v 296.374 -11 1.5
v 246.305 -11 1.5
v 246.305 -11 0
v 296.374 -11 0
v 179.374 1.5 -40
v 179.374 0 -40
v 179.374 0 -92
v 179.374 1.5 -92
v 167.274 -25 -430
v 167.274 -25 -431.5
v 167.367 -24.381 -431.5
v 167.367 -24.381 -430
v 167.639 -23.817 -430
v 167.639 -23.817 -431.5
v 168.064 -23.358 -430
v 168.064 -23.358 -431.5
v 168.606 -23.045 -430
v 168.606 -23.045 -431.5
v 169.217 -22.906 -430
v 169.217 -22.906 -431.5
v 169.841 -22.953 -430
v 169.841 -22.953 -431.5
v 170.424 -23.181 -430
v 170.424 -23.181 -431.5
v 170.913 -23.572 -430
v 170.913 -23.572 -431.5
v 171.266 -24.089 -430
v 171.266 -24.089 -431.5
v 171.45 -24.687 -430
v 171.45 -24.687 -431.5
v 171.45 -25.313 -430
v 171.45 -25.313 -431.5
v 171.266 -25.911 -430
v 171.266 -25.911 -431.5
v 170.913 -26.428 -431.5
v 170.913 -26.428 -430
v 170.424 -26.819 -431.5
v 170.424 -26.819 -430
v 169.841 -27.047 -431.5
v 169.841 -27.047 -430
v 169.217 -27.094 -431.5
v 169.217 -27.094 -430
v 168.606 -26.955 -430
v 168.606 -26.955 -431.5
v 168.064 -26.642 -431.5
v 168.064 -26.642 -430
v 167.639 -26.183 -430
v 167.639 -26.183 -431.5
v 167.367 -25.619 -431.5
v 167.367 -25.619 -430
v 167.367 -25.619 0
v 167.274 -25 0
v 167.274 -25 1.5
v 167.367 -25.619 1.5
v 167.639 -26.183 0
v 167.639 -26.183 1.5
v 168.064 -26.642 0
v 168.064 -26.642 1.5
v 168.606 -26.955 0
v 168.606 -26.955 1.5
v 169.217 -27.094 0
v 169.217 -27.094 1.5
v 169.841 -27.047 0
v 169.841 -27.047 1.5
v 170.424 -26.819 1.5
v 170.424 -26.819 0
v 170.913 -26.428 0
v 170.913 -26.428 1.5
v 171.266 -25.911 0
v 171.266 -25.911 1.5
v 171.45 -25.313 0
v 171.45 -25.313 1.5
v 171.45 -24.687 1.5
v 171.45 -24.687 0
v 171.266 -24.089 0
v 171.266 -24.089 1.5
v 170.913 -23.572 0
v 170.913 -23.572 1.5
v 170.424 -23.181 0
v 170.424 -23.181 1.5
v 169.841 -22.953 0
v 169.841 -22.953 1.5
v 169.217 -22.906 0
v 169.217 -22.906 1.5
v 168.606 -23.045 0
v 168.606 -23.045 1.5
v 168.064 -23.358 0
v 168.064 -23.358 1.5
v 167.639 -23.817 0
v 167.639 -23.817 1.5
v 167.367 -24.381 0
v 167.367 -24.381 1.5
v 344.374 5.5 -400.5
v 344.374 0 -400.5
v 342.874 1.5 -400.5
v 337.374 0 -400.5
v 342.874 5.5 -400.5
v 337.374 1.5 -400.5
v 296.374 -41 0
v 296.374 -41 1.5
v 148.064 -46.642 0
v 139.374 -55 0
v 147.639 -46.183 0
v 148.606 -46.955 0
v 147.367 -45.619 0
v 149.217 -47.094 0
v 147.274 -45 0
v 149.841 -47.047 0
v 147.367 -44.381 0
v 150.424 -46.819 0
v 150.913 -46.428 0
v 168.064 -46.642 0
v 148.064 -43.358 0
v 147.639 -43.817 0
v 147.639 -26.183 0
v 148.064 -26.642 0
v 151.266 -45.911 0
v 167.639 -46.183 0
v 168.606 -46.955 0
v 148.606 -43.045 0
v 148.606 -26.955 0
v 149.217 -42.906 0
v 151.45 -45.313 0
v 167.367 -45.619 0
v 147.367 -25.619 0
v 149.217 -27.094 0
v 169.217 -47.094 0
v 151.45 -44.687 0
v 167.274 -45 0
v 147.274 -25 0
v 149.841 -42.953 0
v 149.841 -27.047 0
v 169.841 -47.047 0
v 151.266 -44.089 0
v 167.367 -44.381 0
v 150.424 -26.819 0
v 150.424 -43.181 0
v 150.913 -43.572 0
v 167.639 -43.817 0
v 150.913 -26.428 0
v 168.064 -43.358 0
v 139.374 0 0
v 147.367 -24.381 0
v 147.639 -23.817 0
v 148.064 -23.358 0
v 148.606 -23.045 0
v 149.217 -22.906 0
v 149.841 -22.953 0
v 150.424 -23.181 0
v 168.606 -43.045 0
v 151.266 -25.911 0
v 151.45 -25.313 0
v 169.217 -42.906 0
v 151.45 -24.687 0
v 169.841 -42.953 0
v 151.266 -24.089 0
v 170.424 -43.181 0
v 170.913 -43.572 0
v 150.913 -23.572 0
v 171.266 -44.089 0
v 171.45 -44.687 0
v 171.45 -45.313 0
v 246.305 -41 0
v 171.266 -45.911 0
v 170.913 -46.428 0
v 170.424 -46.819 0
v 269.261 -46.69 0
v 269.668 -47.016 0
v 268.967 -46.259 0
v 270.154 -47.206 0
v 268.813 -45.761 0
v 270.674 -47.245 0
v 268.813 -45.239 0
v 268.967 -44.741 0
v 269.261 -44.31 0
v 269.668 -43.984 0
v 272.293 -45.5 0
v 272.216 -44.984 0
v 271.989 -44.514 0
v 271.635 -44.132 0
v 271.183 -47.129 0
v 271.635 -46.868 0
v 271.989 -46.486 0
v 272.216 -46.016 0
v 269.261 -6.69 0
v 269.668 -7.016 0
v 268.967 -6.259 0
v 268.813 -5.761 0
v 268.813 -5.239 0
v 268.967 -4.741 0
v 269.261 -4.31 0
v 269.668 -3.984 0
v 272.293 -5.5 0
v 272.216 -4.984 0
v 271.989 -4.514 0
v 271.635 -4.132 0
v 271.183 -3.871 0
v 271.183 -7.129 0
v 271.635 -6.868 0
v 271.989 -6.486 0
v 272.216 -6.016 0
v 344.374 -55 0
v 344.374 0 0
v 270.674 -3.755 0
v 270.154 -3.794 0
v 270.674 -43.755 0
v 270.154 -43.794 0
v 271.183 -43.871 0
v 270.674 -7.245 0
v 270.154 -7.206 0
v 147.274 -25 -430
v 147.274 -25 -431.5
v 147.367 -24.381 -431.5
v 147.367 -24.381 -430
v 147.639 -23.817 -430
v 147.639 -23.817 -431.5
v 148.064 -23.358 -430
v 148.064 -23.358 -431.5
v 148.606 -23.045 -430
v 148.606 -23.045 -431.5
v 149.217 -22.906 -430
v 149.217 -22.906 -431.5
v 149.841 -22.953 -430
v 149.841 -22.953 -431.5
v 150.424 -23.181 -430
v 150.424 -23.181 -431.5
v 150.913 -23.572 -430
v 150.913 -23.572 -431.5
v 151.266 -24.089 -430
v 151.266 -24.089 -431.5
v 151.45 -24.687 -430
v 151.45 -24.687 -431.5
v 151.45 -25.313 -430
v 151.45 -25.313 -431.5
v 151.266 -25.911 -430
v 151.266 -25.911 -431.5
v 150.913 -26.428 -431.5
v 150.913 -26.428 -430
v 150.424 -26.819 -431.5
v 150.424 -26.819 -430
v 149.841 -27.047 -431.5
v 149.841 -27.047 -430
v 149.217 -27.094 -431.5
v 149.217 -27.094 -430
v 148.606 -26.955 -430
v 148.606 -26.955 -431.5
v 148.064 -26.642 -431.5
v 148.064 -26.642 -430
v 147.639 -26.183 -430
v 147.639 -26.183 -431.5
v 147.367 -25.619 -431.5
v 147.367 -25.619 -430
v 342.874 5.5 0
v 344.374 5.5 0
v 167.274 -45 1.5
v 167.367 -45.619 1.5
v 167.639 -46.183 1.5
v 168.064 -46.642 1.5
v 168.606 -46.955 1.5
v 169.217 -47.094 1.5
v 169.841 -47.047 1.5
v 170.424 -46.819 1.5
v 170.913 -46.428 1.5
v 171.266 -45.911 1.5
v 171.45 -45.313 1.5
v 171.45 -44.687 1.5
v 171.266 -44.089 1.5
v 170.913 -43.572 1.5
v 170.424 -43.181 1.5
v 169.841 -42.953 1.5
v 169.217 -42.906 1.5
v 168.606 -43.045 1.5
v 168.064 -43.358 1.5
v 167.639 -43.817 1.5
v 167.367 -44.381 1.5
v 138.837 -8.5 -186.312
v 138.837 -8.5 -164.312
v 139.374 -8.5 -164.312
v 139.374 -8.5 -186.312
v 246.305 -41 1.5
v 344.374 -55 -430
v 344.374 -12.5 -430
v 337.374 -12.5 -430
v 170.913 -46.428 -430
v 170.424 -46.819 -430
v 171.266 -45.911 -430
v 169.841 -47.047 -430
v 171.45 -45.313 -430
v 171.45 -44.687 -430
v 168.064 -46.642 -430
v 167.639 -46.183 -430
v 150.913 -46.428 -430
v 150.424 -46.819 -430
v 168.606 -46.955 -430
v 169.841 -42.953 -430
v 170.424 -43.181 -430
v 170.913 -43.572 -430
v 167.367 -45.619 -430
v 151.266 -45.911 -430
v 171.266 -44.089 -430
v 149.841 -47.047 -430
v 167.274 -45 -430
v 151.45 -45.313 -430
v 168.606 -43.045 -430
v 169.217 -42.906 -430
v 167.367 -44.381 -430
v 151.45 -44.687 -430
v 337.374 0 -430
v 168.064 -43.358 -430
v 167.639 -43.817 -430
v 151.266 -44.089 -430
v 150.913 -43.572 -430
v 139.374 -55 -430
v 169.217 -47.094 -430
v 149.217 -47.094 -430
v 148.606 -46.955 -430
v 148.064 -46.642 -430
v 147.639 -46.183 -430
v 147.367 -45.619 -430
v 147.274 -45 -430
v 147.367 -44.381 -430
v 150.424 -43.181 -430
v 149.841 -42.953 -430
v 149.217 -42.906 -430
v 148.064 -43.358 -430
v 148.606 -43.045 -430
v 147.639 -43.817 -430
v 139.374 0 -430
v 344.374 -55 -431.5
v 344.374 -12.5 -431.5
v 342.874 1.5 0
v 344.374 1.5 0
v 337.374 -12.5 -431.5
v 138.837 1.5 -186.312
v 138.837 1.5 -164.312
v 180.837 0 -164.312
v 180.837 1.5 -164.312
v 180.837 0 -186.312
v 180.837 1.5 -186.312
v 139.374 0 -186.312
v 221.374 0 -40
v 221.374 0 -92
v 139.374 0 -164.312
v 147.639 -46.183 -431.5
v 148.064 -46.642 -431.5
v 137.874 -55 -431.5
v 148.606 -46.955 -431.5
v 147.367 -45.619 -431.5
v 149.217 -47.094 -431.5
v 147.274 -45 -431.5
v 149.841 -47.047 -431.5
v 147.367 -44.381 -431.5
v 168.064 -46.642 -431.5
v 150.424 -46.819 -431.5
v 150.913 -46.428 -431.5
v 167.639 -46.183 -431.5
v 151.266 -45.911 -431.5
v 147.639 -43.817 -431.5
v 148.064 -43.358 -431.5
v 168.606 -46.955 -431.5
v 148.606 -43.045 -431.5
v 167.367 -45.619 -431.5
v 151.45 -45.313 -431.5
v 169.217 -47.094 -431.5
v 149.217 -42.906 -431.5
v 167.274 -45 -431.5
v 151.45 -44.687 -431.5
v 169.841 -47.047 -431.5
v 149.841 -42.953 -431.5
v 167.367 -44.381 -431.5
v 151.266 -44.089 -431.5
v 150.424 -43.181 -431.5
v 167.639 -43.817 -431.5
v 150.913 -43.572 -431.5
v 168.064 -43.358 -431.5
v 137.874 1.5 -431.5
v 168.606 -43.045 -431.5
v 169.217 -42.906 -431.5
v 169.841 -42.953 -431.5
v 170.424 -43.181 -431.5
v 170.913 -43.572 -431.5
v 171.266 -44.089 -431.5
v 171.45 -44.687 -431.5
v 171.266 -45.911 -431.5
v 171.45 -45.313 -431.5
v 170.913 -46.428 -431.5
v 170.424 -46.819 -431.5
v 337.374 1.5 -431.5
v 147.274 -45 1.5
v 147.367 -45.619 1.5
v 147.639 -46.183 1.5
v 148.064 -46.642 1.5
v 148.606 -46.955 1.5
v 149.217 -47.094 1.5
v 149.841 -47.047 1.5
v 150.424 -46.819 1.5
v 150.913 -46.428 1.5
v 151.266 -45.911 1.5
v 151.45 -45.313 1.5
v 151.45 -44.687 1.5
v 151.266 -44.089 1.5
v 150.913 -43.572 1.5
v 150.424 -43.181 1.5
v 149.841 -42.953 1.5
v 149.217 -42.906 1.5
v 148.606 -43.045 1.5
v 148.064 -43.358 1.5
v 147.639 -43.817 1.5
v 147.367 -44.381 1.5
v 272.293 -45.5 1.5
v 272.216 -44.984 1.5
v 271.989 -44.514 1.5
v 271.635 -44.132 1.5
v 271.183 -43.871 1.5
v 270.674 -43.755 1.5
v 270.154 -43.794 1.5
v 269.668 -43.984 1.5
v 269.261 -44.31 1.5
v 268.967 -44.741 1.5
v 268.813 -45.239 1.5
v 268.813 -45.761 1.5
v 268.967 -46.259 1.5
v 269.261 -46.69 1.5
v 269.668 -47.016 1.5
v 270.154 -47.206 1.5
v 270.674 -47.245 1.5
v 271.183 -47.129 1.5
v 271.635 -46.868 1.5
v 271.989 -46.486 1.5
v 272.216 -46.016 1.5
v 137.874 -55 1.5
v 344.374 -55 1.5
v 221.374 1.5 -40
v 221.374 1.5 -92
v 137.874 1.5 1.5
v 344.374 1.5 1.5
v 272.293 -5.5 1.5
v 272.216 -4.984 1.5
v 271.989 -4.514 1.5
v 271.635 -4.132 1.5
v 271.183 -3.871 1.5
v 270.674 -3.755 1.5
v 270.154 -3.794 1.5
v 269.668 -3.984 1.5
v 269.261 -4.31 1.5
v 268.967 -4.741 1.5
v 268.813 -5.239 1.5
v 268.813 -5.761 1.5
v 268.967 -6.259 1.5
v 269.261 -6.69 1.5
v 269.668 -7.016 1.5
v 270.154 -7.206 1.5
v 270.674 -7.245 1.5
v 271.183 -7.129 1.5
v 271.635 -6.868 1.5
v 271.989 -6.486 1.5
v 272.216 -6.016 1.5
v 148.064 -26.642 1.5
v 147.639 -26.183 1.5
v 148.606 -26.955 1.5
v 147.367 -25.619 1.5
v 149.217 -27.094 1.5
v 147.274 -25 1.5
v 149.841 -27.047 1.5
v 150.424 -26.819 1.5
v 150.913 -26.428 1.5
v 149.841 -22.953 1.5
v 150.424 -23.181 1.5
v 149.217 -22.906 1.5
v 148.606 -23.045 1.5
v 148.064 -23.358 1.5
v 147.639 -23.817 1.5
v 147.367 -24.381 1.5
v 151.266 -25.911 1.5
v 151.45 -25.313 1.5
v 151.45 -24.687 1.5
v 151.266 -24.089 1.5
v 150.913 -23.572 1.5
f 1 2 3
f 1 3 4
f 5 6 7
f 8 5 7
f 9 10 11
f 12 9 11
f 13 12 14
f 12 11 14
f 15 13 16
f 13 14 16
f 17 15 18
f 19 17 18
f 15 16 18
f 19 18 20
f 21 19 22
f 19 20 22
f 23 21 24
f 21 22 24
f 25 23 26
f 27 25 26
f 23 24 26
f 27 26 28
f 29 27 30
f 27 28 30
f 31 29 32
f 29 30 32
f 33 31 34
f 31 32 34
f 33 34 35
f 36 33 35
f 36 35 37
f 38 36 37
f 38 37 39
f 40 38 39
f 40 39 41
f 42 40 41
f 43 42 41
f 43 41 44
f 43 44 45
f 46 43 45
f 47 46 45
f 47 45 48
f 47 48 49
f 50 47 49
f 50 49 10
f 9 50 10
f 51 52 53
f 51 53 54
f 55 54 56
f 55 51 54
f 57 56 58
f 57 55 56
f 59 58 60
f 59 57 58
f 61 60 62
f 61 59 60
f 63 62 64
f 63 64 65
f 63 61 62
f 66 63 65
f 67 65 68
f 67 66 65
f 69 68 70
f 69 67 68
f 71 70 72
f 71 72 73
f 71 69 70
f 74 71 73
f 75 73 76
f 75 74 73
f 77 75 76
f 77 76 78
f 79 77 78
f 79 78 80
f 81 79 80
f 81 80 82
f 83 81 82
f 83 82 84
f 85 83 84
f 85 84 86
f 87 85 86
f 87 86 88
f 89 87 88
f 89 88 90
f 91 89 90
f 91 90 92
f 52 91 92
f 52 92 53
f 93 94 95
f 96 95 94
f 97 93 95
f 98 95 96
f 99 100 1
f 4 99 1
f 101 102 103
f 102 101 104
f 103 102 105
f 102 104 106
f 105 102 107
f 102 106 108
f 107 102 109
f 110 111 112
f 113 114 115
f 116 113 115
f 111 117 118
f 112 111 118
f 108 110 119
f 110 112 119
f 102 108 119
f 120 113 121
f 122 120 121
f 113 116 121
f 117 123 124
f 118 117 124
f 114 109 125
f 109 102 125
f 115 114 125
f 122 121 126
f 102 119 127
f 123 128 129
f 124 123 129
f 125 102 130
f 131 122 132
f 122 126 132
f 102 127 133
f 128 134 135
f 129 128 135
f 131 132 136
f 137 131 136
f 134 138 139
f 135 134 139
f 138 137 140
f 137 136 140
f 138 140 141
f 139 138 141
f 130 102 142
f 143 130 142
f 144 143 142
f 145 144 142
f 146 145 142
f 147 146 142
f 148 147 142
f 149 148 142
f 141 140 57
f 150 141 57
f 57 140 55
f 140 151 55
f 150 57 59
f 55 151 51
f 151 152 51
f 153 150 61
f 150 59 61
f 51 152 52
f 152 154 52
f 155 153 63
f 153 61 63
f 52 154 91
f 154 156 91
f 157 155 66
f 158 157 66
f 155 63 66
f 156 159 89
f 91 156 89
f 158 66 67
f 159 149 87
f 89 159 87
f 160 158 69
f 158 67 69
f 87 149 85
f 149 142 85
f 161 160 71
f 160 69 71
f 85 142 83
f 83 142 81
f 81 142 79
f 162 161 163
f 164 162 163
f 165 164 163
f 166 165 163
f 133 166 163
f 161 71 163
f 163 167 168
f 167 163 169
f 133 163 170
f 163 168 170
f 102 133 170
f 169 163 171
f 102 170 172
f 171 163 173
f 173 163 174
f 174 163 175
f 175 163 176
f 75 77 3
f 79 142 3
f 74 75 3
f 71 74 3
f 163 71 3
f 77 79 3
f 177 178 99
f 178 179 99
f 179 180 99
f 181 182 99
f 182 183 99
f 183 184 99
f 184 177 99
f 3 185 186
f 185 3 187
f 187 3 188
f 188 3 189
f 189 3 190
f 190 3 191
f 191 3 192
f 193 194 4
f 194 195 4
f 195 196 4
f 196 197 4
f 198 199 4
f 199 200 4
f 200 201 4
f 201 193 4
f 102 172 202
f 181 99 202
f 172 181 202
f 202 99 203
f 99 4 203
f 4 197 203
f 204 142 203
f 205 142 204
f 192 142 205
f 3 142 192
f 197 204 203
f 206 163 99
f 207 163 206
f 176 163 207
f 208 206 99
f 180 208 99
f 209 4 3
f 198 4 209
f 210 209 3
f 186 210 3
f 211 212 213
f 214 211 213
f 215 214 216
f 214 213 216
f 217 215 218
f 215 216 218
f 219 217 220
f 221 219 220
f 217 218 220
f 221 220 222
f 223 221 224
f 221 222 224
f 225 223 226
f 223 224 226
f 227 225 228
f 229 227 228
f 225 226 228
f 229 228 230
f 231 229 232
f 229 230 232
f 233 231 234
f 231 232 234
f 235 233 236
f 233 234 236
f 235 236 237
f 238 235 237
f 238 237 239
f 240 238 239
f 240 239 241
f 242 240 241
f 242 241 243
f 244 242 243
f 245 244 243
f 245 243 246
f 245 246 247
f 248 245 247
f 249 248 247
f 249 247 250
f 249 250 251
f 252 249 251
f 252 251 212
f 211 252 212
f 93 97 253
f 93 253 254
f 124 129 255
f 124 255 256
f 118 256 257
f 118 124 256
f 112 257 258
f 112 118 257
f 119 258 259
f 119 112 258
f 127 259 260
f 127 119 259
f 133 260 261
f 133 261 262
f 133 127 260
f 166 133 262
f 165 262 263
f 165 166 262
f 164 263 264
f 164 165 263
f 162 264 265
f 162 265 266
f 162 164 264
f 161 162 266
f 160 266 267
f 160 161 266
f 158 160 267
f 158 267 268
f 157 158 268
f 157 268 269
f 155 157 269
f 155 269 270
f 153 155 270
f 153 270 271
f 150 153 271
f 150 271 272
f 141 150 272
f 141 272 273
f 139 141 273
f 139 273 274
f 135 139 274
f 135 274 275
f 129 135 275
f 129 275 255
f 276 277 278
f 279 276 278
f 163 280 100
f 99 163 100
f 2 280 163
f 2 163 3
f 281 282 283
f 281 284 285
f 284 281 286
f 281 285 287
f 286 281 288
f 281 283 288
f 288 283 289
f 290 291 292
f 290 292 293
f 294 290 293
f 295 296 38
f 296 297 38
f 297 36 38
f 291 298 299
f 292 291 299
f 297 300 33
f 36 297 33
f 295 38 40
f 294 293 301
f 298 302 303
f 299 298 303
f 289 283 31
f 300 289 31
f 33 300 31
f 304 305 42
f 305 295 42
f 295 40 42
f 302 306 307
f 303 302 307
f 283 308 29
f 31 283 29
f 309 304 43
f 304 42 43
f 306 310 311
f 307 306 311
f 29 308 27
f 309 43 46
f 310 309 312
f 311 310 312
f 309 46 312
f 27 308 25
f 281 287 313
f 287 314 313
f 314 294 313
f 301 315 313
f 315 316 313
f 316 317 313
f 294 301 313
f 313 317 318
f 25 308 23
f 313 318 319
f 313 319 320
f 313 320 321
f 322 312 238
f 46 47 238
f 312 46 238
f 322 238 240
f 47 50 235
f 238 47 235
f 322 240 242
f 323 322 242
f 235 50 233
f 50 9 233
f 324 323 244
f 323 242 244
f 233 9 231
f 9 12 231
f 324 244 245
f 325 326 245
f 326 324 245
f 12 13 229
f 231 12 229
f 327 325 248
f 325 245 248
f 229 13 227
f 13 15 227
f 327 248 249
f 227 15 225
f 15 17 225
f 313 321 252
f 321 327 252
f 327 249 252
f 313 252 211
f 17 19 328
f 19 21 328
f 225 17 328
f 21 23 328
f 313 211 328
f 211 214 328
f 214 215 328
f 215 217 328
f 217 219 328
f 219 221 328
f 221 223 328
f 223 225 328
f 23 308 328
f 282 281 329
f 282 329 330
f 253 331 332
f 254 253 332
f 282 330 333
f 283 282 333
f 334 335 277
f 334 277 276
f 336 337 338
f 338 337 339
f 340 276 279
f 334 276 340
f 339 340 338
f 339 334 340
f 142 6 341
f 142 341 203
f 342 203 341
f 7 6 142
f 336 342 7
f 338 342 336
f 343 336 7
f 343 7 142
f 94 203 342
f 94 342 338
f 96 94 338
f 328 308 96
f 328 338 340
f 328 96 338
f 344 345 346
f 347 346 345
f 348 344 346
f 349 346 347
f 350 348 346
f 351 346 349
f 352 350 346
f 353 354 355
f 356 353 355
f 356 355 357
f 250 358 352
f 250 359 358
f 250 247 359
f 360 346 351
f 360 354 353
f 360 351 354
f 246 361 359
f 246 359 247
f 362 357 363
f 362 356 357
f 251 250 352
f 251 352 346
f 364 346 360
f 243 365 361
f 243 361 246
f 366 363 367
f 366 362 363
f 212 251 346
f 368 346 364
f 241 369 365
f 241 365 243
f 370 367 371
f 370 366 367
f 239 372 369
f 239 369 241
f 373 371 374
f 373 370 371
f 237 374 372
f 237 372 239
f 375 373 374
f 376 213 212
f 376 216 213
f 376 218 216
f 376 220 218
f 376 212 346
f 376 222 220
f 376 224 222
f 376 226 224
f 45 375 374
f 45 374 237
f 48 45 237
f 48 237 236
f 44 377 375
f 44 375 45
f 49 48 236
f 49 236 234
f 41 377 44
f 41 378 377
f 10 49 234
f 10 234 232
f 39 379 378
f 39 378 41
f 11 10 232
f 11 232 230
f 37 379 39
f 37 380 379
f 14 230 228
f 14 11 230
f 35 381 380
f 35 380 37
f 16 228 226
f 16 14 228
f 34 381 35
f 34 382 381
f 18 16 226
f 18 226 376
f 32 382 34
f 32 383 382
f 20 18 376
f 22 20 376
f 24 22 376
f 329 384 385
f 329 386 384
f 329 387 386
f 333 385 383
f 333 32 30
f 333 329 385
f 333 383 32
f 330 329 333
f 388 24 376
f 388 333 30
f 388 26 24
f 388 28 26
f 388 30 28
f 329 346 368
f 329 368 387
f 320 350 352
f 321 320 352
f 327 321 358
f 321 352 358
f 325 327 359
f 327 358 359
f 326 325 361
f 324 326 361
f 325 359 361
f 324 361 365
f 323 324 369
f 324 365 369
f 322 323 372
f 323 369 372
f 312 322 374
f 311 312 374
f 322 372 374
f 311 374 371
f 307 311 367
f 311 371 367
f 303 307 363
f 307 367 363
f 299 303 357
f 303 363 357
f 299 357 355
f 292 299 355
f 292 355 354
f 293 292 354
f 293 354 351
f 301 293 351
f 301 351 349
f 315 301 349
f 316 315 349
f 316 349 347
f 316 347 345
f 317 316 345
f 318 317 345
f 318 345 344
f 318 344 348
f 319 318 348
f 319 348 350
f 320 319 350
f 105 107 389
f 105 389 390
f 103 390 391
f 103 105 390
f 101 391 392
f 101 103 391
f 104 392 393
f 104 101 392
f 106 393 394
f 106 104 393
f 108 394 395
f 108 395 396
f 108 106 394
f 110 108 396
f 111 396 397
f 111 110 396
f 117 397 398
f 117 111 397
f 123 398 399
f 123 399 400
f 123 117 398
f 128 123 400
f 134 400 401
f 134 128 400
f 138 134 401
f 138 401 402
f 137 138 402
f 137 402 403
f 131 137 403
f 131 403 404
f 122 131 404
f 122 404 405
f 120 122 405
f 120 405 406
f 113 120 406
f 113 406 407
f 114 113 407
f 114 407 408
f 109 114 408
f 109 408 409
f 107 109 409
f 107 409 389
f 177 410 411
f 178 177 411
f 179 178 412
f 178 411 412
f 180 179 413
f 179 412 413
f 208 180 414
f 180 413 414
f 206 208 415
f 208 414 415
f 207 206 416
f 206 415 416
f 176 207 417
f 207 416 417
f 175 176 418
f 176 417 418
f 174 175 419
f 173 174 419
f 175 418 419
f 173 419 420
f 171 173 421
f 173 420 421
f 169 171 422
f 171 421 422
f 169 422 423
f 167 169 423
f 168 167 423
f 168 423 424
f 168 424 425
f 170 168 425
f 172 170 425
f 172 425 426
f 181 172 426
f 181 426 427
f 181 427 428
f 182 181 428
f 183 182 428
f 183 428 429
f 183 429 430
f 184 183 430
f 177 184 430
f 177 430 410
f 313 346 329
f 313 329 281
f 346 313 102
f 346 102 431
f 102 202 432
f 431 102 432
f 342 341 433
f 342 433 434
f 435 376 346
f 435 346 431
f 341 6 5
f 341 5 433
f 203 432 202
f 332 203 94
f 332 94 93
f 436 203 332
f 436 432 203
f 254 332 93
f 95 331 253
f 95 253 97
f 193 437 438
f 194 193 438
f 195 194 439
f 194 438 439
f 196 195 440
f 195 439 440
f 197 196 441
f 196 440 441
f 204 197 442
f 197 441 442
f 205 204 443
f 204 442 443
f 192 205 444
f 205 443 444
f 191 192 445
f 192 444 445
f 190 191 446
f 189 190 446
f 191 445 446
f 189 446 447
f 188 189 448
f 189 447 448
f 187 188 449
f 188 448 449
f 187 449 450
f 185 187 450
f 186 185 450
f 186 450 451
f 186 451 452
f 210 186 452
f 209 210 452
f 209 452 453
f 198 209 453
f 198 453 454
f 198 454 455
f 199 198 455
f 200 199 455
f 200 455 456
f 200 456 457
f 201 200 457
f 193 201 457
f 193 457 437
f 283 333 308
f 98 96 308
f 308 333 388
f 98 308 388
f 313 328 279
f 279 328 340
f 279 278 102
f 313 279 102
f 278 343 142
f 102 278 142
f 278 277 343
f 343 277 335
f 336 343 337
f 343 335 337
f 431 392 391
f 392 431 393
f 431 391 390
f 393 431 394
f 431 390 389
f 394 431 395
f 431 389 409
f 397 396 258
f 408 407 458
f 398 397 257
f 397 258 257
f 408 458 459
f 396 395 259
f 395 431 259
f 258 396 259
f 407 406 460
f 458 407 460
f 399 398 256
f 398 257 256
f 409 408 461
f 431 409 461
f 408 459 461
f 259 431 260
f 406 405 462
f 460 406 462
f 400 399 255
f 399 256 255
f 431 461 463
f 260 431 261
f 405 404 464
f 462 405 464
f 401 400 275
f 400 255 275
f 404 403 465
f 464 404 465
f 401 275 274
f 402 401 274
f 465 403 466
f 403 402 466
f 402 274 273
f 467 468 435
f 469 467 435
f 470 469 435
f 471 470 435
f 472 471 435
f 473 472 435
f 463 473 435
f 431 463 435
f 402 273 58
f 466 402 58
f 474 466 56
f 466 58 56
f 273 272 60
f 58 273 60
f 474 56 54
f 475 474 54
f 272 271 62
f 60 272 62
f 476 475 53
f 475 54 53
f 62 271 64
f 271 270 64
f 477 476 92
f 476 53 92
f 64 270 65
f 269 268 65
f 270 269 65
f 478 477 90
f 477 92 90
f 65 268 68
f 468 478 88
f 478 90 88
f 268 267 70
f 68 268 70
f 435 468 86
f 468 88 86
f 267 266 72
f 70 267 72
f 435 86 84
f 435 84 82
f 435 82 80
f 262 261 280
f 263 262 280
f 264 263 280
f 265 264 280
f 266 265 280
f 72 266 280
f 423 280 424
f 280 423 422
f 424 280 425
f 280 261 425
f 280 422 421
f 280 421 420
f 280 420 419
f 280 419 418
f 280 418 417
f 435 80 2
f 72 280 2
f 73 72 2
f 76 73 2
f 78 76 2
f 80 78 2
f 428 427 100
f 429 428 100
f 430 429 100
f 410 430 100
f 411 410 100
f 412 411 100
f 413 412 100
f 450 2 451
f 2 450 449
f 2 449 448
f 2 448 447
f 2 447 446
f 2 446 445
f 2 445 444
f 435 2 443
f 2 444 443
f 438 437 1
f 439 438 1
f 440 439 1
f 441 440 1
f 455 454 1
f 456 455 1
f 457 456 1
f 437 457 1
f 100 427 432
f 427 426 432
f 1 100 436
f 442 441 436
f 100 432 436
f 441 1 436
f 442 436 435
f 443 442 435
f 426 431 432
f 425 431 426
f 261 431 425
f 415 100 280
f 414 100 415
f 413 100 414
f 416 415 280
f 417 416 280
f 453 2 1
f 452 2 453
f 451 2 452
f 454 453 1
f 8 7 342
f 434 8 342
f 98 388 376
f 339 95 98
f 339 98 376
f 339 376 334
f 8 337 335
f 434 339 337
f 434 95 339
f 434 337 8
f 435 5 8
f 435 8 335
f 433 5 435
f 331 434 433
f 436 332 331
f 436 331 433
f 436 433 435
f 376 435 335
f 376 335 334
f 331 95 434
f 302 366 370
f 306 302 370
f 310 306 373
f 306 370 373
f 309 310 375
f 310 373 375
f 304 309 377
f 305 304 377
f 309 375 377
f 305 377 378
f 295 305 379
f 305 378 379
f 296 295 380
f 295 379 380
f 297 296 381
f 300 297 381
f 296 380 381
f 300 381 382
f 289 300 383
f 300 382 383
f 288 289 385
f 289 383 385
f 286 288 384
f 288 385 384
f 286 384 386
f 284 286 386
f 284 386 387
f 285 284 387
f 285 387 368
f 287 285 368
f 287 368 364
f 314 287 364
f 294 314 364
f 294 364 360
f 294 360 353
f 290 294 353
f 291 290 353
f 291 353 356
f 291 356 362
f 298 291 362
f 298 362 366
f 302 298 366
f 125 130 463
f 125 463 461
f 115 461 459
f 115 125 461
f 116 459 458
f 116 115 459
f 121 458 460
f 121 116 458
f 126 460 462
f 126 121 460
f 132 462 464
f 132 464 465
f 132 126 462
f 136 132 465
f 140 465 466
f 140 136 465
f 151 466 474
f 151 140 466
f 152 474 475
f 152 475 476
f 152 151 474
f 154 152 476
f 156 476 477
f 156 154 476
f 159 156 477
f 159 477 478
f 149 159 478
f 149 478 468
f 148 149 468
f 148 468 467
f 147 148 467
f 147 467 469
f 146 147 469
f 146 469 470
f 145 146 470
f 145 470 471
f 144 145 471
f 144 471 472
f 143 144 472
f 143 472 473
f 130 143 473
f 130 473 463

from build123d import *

# Parameters (mm, degrees)
SKETCH4_W                = 42
SKETCH4_H                = 52
BOSS_EXTRUDE4_DEPTH      = 1.5
BOSS_EXTRUDE5_DEPTH      = 1.5
BOSS_EXTRUDE5_DEPTH_BACK = 0.0001
SKETCH5_W                = 205
SKETCH5_H                = 56.5
SKETCH8_W                = 1.5
SKETCH8_H                = 430
BOSS_EXTRUDE14_DEPTH     = 4
SKETCH7_W                = 205
SKETCH7_H                = 56.5
BOSS_EXTRUDE18_DEPTH     = 1.5
SKETCH9_W                = 433
SKETCH9_H                = 56.5
BOSS_EXTRUDE19_DEPTH     = 1.5
SKETCH15_R               = 2.1
CUT_EXTRUDE1_DEPTH       = 10
CUT_EXTRUDE2_START       = -10
SKETCH14_R               = 2.1
CUT_EXTRUDE2_DEPTH       = 10
CUT_EXTRUDE3_START       = -10
SKETCH12_R               = 2.1
CUT_EXTRUDE3_DEPTH       = 10
CUT_EXTRUDE4_START       = -10
SKETCH10_R               = 2.1
CUT_EXTRUDE4_DEPTH       = 10
CUT_EXTRUDE5_START       = -10
SKETCH11_R               = 2.1
CUT_EXTRUDE5_DEPTH       = 10
SKETCH17_W               = 42
SKETCH17_H               = 22
CUT_EXTRUDE6_DEPTH       = 10
SKETCH18_W               = 50.068809171
SKETCH18_H               = 30
CUT_EXTRUDE7_DEPTH       = 10
SKETCH19_R               = 1.75
CUT_EXTRUDE8_DEPTH       = 10
SKETCH23_W               = 7
SKETCH23_H               = 18
CUT_EXTRUDE10_DEPTH      = 31


with BuildPart() as part:
    # Sketch4 → Boss-Extrude4 (new body)
    with BuildSketch(Plane(origin=(0, 0, 0), x_dir=(1, 0, 0), z_dir=(0, 1, 0))):
        Polygon((139.373653762, 430), (344.373653762, 430), (344.373653762, 0), (139.373653762, 0), (139.373653762, 65), (139.373653762, 230), align=None)
        with Locations((200.373653762, 66)):
            Rectangle(SKETCH4_W, SKETCH4_H, mode=Mode.SUBTRACT)
    extrude(amount=BOSS_EXTRUDE4_DEPTH)

    # Sketch5 → Boss-Extrude5 (add, two sides: drawn at the far end of the back side and taken through both)
    with BuildSketch(Plane.XY.offset(-BOSS_EXTRUDE5_DEPTH_BACK)):
        with Locations((241.873653762, -26.75)):
            Rectangle(SKETCH5_W, SKETCH5_H)
    extrude(amount=BOSS_EXTRUDE5_DEPTH + BOSS_EXTRUDE5_DEPTH_BACK)

    # Sketch8 → Boss-Extrude14 (add)
    with BuildSketch(Plane(origin=(0, 1.5, 0), x_dir=(1, 0, 0), z_dir=(0, 1, 0))):
        with Locations((343.623653762, 215)):
            Rectangle(SKETCH8_W, SKETCH8_H)
    extrude(amount=BOSS_EXTRUDE14_DEPTH)

    # Sketch7 → Boss-Extrude18 (add)
    with BuildSketch(Plane(origin=(0, 0, -430), x_dir=(-1, 0, 0), z_dir=(0, 0, -1))):
        with Locations((-241.873653762, -26.75)):
            Rectangle(SKETCH7_W, SKETCH7_H)
    extrude(amount=BOSS_EXTRUDE18_DEPTH)

    # Sketch9 → Boss-Extrude19 (add)
    with BuildSketch(Plane.ZY.offset(-139.373653762)):
        with Locations((-215, -26.75)):
            Rectangle(SKETCH9_W, SKETCH9_H)
    extrude(amount=BOSS_EXTRUDE19_DEPTH)

    # Sketch15 → Cut-Extrude1 (cut)
    with BuildSketch(Plane(origin=(0, 0, -431.5), x_dir=(-1, 0, 0), z_dir=(0, 0, -1))):
        with Locations((-169.373653762, -25)):
            Circle(SKETCH15_R)
        with Locations((-149.373653762, -25)):
            Circle(SKETCH15_R)
        with Locations((-169.373653762, -45)):
            Circle(SKETCH15_R)
        with Locations((-149.373653762, -45)):
            Circle(SKETCH15_R)
    extrude(amount=-CUT_EXTRUDE1_DEPTH, mode=Mode.SUBTRACT)

    # Sketch14 → Cut-Extrude2 (cut)
    with BuildSketch(Plane.XY.offset(1.5).offset(CUT_EXTRUDE2_START)):
        with Locations(Location((169.373653762, -25, 0), (0, 0, 180))):
            Circle(SKETCH14_R)
    extrude(amount=CUT_EXTRUDE2_DEPTH, mode=Mode.SUBTRACT)

    # Sketch12 → Cut-Extrude3 (cut)
    with BuildSketch(Plane.XY.offset(1.5).offset(CUT_EXTRUDE3_START)):
        with Locations(Location((149.373653762, -25, 0), (0, 0, 180))):
            Circle(SKETCH12_R)
    extrude(amount=CUT_EXTRUDE3_DEPTH, mode=Mode.SUBTRACT)

    # Sketch10 → Cut-Extrude4 (cut)
    with BuildSketch(Plane.XY.offset(1.5).offset(CUT_EXTRUDE4_START)):
        with Locations(Location((169.373653762, -45, 0), (0, 0, 180))):
            Circle(SKETCH10_R)
    extrude(amount=CUT_EXTRUDE4_DEPTH, mode=Mode.SUBTRACT)

    # Sketch11 → Cut-Extrude5 (cut)
    with BuildSketch(Plane.XY.offset(1.5).offset(CUT_EXTRUDE5_START)):
        with Locations(Location((149.373653762, -45, 0), (0, 0, 180))):
            Circle(SKETCH11_R)
    extrude(amount=CUT_EXTRUDE5_DEPTH, mode=Mode.SUBTRACT)

    # Sketch17 → Cut-Extrude6 (cut)
    with BuildSketch(Plane(origin=(0, 1.5, 0), x_dir=(1, 0, 0), z_dir=(0, 1, 0))):
        with Locations((159.837104003, 175.311739833)):
            Rectangle(SKETCH17_W, SKETCH17_H)
    extrude(amount=-CUT_EXTRUDE6_DEPTH, mode=Mode.SUBTRACT)

    # Sketch18 → Cut-Extrude7 (cut)
    with BuildSketch(Plane.XY.offset(1.5)):
        with Locations((271.339249177, -26)):
            Rectangle(SKETCH18_W, SKETCH18_H)
    extrude(amount=-CUT_EXTRUDE7_DEPTH, mode=Mode.SUBTRACT)

    # Sketch19 → Cut-Extrude8 (cut)
    with BuildSketch(Plane.XY.offset(1.5)):
        with Locations((270.543410902, -5.5)):
            Circle(SKETCH19_R)
        with Locations((270.543410902, -45.5)):
            Circle(SKETCH19_R)
    extrude(amount=-CUT_EXTRUDE8_DEPTH, mode=Mode.SUBTRACT)

    # Sketch23 → Cut-Extrude10 (cut)
    with BuildSketch(Plane(origin=(0, 0, -431.5), x_dir=(-1, 0, 0), z_dir=(0, 0, -1))):
        with Locations((-340.873653762, -3.5)):
            Rectangle(SKETCH23_W, SKETCH23_H)
    extrude(amount=-CUT_EXTRUDE10_DEPTH, mode=Mode.SUBTRACT)


solid = part.part
